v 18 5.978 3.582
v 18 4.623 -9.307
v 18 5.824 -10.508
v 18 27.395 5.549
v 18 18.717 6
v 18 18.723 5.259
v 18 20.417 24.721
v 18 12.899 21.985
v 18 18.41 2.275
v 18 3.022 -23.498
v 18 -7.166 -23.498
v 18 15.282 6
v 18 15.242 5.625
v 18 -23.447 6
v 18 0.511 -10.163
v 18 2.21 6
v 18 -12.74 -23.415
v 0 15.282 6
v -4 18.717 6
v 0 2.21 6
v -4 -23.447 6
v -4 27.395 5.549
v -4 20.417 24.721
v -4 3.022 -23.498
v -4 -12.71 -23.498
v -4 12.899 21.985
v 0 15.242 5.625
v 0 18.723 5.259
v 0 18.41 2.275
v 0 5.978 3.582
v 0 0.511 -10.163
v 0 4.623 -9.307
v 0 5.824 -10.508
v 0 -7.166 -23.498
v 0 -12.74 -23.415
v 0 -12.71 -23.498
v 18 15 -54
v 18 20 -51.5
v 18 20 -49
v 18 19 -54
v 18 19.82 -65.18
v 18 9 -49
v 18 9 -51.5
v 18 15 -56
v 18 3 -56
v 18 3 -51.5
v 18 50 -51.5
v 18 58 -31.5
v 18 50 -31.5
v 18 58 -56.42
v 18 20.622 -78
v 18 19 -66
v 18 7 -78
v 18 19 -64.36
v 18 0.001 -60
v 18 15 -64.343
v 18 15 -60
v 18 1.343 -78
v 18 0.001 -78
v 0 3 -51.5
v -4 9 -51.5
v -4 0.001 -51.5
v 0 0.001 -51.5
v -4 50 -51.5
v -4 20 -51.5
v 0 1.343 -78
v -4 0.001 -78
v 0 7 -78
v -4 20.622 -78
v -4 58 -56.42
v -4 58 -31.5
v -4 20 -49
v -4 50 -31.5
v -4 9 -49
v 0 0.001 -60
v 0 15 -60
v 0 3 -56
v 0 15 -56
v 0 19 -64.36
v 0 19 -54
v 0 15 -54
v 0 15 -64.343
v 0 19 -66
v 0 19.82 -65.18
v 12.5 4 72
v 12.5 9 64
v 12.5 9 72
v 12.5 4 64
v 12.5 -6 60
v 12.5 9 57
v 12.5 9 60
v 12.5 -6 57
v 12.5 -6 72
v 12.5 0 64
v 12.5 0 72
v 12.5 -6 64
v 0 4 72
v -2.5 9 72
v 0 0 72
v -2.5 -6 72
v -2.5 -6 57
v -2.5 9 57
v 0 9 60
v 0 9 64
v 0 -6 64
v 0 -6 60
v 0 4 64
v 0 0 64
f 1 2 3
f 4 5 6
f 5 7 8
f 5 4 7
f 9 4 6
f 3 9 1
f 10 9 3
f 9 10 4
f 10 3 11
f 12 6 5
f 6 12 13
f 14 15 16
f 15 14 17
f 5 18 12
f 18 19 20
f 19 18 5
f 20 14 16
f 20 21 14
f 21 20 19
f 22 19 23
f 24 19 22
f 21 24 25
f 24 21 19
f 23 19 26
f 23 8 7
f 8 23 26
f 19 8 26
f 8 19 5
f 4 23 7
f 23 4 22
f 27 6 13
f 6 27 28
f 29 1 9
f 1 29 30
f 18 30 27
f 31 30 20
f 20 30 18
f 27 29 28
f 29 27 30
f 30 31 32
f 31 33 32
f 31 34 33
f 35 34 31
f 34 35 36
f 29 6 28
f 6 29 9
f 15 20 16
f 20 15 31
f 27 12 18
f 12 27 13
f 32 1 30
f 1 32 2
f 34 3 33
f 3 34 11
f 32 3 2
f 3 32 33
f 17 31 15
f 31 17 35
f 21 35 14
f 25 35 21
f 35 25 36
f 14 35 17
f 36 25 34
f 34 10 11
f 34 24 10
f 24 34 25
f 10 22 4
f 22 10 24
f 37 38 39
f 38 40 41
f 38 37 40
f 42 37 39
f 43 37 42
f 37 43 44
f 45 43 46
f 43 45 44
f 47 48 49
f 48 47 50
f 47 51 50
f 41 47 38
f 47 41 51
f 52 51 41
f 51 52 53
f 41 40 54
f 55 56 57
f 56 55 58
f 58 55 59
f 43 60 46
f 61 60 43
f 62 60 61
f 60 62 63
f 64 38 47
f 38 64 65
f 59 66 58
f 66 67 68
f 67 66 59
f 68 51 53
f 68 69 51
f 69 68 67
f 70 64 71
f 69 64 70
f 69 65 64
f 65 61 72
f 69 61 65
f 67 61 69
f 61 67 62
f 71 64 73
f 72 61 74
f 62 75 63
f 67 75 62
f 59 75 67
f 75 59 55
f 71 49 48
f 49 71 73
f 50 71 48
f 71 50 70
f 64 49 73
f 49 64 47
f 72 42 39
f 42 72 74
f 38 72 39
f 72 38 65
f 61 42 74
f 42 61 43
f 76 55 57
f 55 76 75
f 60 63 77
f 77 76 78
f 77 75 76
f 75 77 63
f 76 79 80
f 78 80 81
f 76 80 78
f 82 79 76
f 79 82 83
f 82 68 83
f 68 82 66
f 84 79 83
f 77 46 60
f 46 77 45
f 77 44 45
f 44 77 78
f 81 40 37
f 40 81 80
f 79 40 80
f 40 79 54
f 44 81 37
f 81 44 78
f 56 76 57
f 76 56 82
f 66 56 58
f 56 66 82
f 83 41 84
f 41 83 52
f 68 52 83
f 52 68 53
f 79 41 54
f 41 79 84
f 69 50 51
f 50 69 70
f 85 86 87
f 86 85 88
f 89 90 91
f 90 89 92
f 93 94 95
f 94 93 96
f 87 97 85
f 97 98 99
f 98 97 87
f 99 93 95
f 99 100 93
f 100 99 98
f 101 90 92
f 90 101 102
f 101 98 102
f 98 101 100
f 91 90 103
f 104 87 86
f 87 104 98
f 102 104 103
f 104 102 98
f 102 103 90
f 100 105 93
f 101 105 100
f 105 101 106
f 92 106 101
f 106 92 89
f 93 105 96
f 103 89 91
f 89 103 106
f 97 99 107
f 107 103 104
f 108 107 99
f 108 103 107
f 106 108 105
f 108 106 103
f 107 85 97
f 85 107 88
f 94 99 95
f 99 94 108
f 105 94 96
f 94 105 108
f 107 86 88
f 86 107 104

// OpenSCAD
//
// ktBOX3
//
//


gap1 = 0.001;
gap2 = 0.002;
panel_thick = 2;


A = 1;
B = 1;
C = 1;



if( A ){
difference()
{
    union()
    {
        translate([-(22-14)/2, -34, 3+5-31.5-2]) cube([22, 60, 31.5]);
        translate([-(22-14)/2, 30, -25]) rotate([20, 0, 0]) cube([22, 8, 50]);
    }
    translate([0, 2, 4])
    rotate([-6, 0, 0])
    {
        cube([14+10, 16.5, 3]);
        //translate([(14-10)/2, 9, 3-gap1]) cube([10, 4, 5+gap2]);
        translate([0, 9, 3-gap1]) cube([14+10, 4, 5+gap2]);
        translate([0, 0, -20+3+2.5-gap1]) cube([14+10, 4, 20]);
        translate([0, -23, -49]) rotate([51, 0, 0]) cube([14+10, 45, 4]);
    }
    
    translate([-5, -33, -35]) rotate([20, 0, 0]) cube([14+10, 23, 50]);
    translate([-5, -30, -28.5]) cube([14+10, 60, 5+gap2]);
    translate([-5, 33, -50]) rotate([50, 0, 0]) cube([14+10, 60, 40]);
    //translate([-3, -35, -28.5]) cube([30, 80, 100]);
}
}


if( B ){
translate([0, 0, -60])
difference()
{
     union()
    {
        translate([-(22-14)/2, 0+gap1, -18]) cube([22, 50, 26.5]);
        translate([-(22-14)/2, 50, -18]) cube([22, 8, 26.5+20]);
        translate([-(22-14)/2, 9, 8]) cube([22, 11, 3]);
    }
    translate([0, 0, 0])
    {
        cube([14+10, 3, 16.5]);
        translate([0, 0, 0]) cube([14+10, 15+gap1, 4]);
        translate([0, 15, -6]) cube([14+10, 4, 12]);
        translate([0, -12, -37]) rotate([45, 0, 0]) cube([14+10, 45, 4]);
    }
    translate([-5, 40, -53]) rotate([30, 0, 0]) cube([14+10, 80, 40]);
    
    //translate([5, -35, -28.5]) cube([30, 100, 100]);
}
}


if( C ){
translate([0, 0, 60])
difference()
{
     translate([-(15-10)/2, -6, -3]) cube([15, 15, 15]);

    translate([0, 0, 0]) cube([14+10, 4, 12+gap1]);
    translate([0, -6-gap1, 0]) cube([14+10, 15+gap2, 4]);
    
    //translate([5, -35, -28.5]) cube([30, 100, 100]);
}
}
